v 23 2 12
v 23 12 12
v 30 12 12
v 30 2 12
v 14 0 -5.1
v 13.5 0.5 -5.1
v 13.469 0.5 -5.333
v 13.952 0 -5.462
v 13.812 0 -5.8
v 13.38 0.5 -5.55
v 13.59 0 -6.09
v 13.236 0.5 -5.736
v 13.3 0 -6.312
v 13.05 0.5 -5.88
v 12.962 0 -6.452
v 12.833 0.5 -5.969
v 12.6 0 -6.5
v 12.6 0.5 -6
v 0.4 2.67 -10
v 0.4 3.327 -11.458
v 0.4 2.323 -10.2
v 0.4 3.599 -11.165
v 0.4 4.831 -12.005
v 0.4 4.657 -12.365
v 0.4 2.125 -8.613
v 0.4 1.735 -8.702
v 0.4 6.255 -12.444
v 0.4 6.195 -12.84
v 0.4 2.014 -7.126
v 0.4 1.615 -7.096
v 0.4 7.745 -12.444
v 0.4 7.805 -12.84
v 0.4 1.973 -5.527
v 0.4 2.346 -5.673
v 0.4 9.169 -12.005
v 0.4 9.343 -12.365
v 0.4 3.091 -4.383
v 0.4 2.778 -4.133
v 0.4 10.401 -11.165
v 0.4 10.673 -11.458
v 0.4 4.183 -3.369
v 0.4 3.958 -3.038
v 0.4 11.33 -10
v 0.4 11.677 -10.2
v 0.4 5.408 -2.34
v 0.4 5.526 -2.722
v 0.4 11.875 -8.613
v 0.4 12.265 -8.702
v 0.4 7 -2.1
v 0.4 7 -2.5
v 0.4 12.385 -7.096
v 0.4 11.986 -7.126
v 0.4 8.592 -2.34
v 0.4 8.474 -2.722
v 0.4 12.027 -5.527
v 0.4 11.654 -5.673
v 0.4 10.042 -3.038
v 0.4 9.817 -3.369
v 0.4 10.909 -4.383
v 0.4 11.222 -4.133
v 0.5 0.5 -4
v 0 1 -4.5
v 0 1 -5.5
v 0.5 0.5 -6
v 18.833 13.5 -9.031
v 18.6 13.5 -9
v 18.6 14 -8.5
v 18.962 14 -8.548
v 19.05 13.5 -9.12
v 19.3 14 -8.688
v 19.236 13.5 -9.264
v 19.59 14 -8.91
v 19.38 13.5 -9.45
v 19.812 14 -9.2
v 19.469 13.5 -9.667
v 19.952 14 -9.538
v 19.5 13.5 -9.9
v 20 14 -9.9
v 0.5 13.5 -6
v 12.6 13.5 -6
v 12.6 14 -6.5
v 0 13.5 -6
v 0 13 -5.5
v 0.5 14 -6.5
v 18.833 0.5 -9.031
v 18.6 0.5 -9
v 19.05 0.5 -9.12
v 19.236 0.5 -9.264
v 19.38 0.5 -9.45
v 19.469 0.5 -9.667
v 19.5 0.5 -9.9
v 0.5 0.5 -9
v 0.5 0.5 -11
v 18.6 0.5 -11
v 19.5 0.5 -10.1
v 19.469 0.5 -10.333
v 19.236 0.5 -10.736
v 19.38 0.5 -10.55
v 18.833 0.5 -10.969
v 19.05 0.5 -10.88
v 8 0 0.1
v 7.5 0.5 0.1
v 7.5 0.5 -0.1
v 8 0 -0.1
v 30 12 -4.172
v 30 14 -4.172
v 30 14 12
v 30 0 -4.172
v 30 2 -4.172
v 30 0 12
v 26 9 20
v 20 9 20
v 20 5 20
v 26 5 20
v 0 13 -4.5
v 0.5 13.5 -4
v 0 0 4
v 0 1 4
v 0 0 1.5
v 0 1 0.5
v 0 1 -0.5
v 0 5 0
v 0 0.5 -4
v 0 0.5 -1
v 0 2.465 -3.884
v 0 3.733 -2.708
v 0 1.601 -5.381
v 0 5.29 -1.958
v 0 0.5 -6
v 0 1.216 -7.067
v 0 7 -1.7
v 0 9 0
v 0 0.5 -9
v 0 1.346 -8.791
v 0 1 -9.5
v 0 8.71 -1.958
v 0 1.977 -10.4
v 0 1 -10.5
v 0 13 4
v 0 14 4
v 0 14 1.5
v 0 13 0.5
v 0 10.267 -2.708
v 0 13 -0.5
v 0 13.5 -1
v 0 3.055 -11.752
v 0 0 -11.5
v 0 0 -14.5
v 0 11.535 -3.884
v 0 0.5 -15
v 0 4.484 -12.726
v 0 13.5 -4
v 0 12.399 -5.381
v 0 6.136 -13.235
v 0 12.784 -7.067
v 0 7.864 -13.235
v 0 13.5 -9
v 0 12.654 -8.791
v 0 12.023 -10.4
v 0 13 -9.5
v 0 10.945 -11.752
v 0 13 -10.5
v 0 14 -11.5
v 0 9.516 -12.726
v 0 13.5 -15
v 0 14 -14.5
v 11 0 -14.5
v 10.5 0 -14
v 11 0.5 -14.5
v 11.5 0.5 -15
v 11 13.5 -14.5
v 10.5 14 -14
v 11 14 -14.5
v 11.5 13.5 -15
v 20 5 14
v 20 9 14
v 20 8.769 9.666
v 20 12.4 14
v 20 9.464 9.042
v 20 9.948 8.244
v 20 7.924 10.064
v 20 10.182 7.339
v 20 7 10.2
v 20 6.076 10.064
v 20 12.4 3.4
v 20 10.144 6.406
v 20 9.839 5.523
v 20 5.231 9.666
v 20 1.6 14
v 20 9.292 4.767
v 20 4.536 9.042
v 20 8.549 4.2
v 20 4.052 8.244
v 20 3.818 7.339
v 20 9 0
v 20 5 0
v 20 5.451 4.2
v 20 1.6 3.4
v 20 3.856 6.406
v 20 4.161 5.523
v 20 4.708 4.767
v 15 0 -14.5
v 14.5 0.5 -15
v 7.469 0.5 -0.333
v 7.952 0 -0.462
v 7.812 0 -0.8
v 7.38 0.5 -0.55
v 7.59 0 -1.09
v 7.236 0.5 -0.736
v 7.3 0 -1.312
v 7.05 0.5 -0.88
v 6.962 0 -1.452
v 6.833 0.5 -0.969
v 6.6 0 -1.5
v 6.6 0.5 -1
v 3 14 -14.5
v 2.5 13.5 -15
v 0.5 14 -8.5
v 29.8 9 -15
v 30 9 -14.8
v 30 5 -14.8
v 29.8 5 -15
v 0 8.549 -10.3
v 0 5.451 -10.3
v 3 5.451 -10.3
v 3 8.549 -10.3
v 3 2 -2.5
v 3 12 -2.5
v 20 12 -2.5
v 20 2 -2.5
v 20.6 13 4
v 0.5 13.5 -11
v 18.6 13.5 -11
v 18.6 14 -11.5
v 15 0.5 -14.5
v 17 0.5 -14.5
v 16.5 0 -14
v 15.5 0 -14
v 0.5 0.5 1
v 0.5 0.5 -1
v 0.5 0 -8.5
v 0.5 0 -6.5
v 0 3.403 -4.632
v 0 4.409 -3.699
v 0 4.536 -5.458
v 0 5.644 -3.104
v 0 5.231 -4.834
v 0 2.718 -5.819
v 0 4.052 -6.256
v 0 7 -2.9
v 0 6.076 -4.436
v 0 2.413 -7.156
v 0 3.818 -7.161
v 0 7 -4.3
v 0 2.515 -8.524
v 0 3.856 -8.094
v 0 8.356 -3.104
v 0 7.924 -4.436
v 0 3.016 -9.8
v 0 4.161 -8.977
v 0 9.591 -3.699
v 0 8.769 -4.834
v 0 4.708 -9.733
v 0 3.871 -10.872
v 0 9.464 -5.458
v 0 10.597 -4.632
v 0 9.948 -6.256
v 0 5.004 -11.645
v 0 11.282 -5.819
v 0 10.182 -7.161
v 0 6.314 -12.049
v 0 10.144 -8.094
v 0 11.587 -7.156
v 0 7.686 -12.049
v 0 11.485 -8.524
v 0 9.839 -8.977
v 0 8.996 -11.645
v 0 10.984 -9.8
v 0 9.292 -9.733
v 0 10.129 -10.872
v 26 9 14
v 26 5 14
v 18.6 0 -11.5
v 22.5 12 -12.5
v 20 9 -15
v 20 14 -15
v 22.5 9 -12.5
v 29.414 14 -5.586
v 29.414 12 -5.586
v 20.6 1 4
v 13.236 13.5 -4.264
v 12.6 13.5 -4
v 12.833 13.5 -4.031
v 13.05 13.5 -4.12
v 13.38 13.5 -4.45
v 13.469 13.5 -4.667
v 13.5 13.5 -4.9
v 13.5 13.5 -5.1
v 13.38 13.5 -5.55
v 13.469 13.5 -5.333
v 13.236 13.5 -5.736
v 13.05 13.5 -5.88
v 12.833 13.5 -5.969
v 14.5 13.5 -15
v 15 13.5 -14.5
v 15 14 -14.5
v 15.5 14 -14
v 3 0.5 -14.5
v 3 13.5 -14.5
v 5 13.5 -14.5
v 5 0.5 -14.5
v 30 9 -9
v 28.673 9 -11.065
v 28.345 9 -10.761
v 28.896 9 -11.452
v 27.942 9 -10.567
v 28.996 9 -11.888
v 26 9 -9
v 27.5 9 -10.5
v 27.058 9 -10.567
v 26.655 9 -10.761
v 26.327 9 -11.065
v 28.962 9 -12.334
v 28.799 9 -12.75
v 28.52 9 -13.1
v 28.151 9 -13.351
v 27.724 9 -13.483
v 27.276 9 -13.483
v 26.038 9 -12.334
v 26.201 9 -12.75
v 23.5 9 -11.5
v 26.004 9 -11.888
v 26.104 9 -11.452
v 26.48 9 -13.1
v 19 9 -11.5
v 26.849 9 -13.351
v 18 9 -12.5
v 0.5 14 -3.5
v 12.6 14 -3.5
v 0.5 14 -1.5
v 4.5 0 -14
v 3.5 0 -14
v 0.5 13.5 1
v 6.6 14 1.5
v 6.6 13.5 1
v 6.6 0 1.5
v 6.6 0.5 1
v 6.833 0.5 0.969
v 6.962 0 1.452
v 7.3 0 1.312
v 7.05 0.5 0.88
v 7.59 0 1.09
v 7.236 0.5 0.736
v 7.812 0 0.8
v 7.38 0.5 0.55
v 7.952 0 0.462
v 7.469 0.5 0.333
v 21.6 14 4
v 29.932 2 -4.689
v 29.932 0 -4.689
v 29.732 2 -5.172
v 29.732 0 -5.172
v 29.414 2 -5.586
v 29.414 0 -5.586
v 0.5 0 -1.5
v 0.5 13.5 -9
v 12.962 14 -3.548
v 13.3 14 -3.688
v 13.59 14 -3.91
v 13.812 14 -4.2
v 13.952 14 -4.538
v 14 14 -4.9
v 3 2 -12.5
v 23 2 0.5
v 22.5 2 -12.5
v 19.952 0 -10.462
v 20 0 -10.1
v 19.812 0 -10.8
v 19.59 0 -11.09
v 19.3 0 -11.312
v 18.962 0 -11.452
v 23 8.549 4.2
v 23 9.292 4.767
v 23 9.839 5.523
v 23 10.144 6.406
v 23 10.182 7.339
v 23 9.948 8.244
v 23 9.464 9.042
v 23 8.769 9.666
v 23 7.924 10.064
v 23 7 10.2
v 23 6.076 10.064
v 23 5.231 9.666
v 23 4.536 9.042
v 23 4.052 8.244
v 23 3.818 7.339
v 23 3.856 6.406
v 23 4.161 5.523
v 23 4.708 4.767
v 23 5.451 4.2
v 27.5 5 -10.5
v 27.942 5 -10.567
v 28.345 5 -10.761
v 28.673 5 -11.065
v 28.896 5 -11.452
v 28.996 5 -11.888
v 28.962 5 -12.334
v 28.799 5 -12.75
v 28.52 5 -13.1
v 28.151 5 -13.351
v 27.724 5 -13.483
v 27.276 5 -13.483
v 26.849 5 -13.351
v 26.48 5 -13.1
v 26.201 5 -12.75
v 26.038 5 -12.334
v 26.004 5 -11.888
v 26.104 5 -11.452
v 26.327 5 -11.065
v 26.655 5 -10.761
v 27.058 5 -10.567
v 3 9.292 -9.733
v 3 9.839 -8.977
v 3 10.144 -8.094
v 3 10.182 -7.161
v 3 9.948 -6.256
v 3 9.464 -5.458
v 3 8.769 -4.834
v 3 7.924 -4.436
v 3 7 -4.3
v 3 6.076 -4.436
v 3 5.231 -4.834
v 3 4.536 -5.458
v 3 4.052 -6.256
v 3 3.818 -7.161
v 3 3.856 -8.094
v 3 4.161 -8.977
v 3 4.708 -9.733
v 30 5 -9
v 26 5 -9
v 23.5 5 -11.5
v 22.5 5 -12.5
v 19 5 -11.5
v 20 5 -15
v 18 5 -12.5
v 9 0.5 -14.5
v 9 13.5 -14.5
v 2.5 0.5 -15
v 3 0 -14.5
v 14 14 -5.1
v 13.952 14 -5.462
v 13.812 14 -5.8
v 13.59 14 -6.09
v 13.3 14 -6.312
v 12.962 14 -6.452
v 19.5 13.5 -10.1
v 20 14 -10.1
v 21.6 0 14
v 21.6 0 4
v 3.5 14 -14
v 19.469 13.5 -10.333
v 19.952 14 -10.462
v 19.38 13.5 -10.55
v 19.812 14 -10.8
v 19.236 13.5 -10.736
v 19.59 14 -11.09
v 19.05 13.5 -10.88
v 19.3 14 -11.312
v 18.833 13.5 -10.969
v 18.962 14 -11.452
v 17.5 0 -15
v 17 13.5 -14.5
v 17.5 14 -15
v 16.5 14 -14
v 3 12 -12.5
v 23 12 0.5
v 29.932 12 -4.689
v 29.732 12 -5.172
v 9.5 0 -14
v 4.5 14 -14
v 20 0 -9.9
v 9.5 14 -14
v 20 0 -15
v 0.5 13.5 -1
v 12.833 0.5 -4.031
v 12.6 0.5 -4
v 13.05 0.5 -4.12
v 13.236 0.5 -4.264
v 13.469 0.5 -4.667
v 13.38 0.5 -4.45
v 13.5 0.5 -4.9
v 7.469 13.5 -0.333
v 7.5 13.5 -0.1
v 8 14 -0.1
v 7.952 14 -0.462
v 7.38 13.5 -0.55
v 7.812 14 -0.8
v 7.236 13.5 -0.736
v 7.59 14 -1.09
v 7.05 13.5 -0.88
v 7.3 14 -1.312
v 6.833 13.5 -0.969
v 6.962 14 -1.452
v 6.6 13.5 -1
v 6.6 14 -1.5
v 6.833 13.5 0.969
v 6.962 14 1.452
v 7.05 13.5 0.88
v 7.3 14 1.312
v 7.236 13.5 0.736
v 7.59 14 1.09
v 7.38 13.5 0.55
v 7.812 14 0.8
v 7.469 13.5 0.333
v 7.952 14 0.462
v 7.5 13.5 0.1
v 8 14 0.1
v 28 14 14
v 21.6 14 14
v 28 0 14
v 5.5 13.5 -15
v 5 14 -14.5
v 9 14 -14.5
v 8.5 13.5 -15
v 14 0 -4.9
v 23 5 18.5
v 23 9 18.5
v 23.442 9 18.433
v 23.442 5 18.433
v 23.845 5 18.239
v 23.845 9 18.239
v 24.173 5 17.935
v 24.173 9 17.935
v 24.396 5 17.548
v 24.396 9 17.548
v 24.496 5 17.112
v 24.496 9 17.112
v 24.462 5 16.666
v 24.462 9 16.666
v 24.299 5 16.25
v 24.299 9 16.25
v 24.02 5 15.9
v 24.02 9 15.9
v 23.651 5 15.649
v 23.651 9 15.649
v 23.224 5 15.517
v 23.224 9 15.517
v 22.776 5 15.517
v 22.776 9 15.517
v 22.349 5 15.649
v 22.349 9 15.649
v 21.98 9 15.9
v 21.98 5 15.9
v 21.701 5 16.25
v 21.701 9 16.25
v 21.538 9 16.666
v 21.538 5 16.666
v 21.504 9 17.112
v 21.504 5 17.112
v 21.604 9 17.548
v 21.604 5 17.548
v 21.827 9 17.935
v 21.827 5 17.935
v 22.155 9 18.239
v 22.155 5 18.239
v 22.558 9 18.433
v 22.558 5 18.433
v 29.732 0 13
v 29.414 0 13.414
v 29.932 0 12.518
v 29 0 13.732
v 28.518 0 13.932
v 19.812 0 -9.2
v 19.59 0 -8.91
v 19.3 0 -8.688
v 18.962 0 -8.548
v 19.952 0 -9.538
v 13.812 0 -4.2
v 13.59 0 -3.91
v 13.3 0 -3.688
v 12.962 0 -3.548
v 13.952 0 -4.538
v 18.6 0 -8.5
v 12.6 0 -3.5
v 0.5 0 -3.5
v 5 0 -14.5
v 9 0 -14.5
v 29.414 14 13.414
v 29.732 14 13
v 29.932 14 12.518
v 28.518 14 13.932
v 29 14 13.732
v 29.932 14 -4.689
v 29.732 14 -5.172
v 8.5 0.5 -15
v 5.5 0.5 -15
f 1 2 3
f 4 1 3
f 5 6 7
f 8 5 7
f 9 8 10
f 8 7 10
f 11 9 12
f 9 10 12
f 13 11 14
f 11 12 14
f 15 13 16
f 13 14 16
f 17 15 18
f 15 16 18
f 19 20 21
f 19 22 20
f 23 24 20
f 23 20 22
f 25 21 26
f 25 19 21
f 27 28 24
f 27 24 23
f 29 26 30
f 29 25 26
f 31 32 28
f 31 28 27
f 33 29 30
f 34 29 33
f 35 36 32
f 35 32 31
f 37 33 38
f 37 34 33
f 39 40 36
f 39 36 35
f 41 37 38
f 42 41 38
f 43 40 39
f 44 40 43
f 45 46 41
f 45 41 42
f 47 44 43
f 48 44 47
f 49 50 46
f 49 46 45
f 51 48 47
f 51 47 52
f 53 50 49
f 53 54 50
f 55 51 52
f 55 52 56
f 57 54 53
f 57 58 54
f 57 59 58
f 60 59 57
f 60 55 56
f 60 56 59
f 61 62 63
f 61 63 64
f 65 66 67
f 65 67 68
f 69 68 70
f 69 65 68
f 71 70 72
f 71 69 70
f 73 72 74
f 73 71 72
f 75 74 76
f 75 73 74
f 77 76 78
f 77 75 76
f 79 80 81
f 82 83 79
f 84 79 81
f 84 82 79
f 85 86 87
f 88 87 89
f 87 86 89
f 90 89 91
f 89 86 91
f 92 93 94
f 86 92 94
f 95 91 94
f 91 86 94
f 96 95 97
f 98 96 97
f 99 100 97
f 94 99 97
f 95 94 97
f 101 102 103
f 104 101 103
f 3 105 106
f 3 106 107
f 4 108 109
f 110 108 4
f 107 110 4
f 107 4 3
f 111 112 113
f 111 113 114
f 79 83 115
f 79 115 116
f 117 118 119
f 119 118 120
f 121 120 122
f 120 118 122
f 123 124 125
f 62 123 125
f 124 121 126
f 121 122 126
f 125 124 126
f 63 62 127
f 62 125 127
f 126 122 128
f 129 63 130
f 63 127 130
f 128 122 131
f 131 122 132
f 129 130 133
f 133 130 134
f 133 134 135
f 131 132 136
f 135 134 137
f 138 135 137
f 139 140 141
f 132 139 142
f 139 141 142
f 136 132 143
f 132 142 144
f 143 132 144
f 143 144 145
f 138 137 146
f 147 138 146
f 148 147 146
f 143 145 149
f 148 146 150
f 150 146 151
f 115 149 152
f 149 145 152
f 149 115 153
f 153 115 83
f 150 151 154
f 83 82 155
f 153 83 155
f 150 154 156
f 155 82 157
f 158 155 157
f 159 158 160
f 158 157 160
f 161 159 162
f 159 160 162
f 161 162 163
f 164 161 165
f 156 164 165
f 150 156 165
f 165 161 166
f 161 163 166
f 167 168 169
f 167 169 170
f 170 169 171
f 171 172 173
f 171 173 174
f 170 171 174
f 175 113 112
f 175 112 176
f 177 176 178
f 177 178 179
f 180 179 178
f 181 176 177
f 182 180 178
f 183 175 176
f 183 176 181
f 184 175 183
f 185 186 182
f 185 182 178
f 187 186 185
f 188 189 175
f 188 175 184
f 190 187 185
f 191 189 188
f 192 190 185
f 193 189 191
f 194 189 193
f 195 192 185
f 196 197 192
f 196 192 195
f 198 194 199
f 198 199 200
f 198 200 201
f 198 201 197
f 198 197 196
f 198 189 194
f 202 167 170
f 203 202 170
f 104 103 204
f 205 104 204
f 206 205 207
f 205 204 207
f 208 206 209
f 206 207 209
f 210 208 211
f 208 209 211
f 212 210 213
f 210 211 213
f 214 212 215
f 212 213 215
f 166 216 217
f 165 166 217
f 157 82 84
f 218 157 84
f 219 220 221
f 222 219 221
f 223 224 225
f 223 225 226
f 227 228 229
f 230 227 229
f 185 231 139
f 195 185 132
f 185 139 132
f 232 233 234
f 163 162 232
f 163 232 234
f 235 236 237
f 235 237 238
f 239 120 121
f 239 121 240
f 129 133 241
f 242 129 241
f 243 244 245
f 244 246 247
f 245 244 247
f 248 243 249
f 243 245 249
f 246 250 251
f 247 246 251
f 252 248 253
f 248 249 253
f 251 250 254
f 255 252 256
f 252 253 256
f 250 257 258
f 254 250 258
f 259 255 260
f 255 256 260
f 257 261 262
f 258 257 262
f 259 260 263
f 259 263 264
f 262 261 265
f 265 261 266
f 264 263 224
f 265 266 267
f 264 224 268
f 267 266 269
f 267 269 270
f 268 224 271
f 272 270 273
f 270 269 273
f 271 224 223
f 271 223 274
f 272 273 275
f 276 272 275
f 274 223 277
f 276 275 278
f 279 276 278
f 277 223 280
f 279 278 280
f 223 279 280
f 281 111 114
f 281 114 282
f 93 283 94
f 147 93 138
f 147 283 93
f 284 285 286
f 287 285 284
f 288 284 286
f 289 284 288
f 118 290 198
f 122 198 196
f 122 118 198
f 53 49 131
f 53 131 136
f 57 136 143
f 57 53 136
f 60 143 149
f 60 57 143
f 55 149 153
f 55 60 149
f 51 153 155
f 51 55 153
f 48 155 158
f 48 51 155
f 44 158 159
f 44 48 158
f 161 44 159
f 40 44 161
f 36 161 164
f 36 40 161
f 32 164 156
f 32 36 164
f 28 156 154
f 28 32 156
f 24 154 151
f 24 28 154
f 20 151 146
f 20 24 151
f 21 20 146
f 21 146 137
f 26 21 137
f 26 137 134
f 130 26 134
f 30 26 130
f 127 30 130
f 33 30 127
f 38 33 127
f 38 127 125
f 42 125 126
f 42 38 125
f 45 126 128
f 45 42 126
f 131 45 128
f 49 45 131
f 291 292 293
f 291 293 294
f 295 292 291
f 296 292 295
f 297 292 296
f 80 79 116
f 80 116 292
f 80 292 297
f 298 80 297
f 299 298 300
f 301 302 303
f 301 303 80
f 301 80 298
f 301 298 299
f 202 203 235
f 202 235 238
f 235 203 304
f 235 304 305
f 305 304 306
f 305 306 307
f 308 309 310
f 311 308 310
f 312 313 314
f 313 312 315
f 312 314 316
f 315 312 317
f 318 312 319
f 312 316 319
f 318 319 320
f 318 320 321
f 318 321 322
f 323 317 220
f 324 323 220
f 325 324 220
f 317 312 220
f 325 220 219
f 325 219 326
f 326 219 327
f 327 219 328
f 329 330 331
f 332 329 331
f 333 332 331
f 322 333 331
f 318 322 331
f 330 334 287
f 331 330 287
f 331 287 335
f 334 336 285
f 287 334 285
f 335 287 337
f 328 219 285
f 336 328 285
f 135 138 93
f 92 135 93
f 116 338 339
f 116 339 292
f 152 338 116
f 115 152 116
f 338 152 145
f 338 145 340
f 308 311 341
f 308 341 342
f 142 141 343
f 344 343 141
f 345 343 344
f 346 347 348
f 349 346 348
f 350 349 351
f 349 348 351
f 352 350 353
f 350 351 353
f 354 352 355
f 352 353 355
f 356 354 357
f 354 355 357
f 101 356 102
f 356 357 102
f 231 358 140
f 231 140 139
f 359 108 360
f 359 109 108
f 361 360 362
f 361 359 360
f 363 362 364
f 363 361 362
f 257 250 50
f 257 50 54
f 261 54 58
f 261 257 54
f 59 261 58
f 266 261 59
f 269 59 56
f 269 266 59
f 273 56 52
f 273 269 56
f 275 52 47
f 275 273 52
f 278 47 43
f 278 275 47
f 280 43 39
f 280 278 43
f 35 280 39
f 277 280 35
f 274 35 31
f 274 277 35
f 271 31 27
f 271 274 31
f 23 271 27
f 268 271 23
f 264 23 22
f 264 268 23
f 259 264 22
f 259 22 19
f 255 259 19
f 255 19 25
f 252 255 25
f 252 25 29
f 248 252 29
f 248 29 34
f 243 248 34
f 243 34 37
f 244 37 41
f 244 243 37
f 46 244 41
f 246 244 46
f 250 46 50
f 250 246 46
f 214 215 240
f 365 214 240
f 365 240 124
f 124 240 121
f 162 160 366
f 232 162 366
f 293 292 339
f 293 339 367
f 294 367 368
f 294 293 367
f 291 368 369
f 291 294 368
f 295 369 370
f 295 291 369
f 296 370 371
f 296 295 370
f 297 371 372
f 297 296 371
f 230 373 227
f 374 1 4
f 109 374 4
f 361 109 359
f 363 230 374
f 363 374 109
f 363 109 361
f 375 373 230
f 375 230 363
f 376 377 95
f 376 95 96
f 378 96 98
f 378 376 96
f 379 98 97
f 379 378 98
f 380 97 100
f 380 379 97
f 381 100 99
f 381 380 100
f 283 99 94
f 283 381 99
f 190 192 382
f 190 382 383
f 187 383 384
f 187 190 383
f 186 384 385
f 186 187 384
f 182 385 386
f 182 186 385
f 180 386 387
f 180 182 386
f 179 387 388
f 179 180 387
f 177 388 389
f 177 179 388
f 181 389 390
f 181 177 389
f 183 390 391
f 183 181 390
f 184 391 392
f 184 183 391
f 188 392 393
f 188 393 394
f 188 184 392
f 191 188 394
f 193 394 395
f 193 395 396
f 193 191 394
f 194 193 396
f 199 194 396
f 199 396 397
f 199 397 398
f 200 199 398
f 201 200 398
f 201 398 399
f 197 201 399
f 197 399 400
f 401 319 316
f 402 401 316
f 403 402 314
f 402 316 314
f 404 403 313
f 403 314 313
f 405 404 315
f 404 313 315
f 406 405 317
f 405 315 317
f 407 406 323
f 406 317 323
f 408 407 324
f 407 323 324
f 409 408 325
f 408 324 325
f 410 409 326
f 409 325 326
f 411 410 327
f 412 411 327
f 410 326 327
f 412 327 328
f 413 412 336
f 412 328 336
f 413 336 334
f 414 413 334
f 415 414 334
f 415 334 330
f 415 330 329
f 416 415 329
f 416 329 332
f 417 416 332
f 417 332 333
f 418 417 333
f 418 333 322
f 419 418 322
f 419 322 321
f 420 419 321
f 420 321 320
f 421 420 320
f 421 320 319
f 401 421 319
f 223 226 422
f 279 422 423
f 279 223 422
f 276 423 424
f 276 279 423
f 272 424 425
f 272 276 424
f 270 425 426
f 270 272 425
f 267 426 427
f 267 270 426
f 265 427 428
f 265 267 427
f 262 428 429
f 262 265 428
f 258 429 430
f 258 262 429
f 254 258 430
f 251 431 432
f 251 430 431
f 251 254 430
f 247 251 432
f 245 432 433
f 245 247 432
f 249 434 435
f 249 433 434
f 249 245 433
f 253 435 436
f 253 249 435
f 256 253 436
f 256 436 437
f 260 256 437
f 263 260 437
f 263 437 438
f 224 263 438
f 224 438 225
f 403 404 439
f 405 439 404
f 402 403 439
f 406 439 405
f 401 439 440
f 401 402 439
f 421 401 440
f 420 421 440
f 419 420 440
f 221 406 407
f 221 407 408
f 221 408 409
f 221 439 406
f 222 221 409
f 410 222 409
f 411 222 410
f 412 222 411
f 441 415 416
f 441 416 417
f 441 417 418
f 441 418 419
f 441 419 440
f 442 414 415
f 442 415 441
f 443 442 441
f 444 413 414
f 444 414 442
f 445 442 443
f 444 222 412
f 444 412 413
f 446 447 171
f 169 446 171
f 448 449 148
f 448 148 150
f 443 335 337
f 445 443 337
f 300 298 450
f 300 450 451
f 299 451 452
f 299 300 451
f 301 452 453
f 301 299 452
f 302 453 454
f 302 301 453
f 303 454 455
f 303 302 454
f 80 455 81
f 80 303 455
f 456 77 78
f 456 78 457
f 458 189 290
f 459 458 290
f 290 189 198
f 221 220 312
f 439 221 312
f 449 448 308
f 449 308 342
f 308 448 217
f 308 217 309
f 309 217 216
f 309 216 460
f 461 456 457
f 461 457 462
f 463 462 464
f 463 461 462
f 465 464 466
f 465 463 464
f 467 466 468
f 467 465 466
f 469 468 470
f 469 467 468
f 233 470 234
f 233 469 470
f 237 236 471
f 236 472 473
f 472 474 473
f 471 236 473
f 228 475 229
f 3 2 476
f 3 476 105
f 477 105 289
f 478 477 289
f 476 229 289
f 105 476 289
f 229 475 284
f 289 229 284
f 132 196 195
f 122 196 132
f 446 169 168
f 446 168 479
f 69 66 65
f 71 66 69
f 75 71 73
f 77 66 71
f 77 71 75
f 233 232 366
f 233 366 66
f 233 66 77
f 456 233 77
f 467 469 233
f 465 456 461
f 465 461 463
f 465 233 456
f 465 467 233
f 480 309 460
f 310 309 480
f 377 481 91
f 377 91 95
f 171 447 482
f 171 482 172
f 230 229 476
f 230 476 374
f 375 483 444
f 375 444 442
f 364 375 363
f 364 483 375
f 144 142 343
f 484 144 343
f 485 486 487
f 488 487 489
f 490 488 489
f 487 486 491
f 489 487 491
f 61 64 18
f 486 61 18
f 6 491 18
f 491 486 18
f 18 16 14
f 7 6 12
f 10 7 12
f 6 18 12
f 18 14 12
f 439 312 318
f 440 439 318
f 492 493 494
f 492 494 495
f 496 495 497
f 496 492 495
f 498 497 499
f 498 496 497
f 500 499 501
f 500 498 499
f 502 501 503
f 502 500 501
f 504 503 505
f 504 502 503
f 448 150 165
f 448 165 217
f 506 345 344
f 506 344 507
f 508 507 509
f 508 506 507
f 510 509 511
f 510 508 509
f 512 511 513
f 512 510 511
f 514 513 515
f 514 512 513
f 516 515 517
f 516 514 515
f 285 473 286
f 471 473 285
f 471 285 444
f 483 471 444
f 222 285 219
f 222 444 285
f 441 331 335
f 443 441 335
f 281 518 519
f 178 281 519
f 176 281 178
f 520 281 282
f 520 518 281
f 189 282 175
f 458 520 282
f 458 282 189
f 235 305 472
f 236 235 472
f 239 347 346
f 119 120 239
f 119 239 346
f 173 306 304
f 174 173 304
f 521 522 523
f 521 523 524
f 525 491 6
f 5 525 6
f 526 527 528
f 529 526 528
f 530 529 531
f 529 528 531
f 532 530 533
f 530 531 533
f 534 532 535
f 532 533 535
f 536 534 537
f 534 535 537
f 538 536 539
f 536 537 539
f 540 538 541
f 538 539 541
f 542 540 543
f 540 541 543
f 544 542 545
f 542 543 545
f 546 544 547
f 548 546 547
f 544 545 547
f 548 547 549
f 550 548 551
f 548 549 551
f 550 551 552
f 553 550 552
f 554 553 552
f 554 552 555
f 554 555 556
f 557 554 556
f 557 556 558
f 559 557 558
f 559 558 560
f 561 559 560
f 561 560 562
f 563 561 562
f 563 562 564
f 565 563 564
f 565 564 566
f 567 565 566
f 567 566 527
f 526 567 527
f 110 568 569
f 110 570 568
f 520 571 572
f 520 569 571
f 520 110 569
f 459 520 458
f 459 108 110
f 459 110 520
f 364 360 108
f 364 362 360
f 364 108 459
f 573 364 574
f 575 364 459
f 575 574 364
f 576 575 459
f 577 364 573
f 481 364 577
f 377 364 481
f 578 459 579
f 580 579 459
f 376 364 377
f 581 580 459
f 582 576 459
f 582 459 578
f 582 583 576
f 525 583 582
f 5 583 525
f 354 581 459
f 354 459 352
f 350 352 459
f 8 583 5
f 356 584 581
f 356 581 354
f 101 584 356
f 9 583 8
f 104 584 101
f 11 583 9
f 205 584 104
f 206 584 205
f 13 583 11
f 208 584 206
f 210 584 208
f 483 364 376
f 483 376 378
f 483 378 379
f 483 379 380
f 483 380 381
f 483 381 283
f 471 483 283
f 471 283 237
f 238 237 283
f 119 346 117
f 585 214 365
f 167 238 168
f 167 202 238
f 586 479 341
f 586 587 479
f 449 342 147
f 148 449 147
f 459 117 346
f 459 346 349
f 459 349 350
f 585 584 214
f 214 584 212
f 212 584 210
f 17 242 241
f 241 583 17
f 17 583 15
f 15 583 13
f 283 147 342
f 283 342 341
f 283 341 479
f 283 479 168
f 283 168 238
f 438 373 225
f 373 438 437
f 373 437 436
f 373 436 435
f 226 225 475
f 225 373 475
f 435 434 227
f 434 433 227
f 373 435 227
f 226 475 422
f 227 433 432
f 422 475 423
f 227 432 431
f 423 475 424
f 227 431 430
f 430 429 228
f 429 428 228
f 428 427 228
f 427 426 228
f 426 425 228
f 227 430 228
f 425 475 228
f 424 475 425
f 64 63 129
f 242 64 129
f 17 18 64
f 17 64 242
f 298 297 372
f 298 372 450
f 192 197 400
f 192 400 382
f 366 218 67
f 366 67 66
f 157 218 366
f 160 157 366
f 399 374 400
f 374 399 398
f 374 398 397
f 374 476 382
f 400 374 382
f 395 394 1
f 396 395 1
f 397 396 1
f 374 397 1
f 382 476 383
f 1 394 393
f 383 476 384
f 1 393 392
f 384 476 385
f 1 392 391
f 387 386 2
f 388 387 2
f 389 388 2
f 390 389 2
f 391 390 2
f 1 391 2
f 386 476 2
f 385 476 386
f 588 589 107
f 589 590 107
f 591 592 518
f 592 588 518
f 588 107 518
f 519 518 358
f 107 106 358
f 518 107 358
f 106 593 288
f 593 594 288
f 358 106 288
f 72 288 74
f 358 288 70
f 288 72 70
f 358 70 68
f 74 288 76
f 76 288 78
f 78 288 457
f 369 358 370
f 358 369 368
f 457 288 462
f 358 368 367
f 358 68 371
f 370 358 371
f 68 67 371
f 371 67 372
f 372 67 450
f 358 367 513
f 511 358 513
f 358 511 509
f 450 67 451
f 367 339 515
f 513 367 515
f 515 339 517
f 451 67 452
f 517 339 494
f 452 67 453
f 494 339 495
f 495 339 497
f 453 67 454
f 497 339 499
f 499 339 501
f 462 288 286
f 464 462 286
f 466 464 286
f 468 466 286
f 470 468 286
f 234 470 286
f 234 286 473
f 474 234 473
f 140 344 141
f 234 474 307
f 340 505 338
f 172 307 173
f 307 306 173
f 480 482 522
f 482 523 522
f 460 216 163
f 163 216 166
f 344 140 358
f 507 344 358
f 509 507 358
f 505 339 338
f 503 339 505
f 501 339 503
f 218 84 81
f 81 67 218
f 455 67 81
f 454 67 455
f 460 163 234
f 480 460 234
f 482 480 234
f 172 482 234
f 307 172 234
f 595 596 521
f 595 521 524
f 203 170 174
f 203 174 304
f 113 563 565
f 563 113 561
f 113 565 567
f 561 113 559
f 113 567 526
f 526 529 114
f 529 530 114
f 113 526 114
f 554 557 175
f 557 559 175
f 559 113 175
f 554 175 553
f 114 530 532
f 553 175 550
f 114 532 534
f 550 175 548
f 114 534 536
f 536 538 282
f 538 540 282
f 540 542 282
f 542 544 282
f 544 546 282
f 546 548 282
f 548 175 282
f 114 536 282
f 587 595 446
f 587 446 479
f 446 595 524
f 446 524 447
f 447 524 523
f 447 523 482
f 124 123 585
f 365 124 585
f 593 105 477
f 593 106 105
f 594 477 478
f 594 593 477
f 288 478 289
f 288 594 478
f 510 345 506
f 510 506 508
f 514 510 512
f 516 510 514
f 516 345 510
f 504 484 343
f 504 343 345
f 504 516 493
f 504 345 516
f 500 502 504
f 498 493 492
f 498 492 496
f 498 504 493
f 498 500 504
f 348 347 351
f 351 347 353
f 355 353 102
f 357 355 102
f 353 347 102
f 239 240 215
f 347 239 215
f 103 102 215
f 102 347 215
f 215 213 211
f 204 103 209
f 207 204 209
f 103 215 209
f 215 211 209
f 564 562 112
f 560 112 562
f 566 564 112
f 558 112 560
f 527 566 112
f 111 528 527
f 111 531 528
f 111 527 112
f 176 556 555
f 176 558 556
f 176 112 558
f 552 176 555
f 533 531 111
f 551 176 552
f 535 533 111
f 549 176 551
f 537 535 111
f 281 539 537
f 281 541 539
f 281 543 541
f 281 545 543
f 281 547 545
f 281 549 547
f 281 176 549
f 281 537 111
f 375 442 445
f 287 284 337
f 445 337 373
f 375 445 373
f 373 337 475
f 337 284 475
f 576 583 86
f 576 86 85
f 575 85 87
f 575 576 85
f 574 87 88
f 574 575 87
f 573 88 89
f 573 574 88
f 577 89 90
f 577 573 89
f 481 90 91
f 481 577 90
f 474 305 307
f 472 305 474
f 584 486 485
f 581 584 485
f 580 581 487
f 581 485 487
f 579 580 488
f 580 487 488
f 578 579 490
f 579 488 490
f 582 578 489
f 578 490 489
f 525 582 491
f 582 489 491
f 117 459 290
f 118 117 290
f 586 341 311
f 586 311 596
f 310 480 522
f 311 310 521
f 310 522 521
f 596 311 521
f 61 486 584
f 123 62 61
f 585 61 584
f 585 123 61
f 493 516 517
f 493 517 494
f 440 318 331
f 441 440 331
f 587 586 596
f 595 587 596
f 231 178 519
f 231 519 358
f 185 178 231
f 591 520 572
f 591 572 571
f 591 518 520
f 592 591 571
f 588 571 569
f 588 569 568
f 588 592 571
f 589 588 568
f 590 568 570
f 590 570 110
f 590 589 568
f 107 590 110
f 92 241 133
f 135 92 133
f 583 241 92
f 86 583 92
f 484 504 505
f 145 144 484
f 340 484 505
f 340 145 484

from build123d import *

# Parameters (mm, degrees)
EXTRUDE_1_DEPTH     = 14
CUT_EXTRUDE_1_DEPTH = 3
CHAMFER_1_SIZE      = 1.6
EXTRUDE_START       = -5
SKETCH_3_W          = 6
SKETCH_3_H          = 6
EXTRUDE_3_DEPTH     = 4
CUT_EXTRUDE_2_DEPTH = 3.4
CUT_EXTRUDE_START   = -2
CUT_EXTRUDE_3_DEPTH = 10
EXTRUDE_4_DEPTH     = 4
CHAMFER_2_SIZE      = 3
SKETCH_7_R          = 1.5
CUT_EXTRUDE_4_DEPTH = 39.678159212
CHAMFER_3_SIZE      = 0.2
CUT_EXTRUDE_5_DEPTH = 39.678159212
CHAMFER_5_SIZE      = 0.5
EXTRUDE_5_DEPTH     = 22
CUT_EXTRUDE_6_DEPTH = 0.5
CUT_EXTRUDE_START_2 = -13.5
CUT_EXTRUDE_7_DEPTH = 0.5
SKETCH_13_R         = 5.4
SKETCH_13_R_2       = 5
CUT_EXTRUDE_8_DEPTH = 0.4
CHAMFER_7_SIZE      = 0.4
CHAMFER_8_SIZE      = 0.5
CHAMFER_6_SIZE      = 0.5
CHAMFER_9_SIZE      = 0.4
FILLET_1_R          = 2


# Some blends are built 0.0001 mm under size
with BuildPart() as part:
    # 草图1 → 凸台-拉伸1 (new body)
    with BuildSketch(Plane(origin=(0, 0, 0), x_dir=(1, 0, 0), z_dir=(0, 1, 0))):
        Polygon((20, 15), (30, 5), (30, -14), (20, -14), (20, 0), (0, 0), (0, 15), align=None)
    extrude(amount=EXTRUDE_1_DEPTH)

    # 草图2 → 切除-拉伸1 (cut)
    with BuildSketch(Plane.ZY.offset(-20)):
        with BuildLine():
            Line((4.2, 5.450806662), (4.2, 8.549193338))
            ThreePointArc((4.2, 8.549193338), (10.2, 7), (4.2, 5.450806662))
        make_face()
    extrude(amount=-CUT_EXTRUDE_1_DEPTH, mode=Mode.SUBTRACT)

    # 倒角1
    chamfer_1_edges = [part.edges().sort_by_distance(p)[0] for p in [
        (20, 14, 7),
        (20, 0, 7),
    ]]
    chamfer(chamfer_1_edges, length=CHAMFER_1_SIZE)

    # 草图3 → 凸台-拉伸3 (add)
    with BuildSketch(Plane(origin=(0, 14, 0), x_dir=(1, 0, 0), z_dir=(0, 1, 0)).offset(EXTRUDE_START)):
        with Locations((23, -17)):
            Rectangle(SKETCH_3_W, SKETCH_3_H)
    extrude(amount=-EXTRUDE_3_DEPTH)

    # 草图4 → 切除-拉伸2 (cut)
    with BuildSketch(Plane.ZY):
        with BuildLine():
            Line((-10.3, 5.450806662), (-10.3, 8.549193338))
            ThreePointArc((-10.3, 8.549193338), (-4.3, 7), (-10.3, 5.450806662))
        make_face()
    extrude(amount=-CUT_EXTRUDE_2_DEPTH, mode=Mode.SUBTRACT)

    # 草图5 → 切除-拉伸3 (cut)
    with BuildSketch(Plane(origin=(0, 14, 0), x_dir=(1, 0, 0), z_dir=(0, 1, 0)).offset(CUT_EXTRUDE_START)):
        Polygon((3, 2.5), (23, 2.5), (23, -12), (30, -12), (30, 12.5), (3, 12.5), align=None)
    extrude(amount=-CUT_EXTRUDE_3_DEPTH, mode=Mode.SUBTRACT)

    # 草图6 → 凸台-拉伸4 (add)
    with BuildSketch(Plane(origin=(0, 14, 0), x_dir=(1, 0, 0), z_dir=(0, 1, 0)).offset(EXTRUDE_START)):
        Polygon((23.5, 11.5), (19, 11.5), (18, 12.5), (22.5, 12.5), (20, 15), (30, 15), (30, 9), (26, 9), align=None)
    extrude(amount=-EXTRUDE_4_DEPTH)

    # 倒角2
    chamfer_2_edges = [part.edges().sort_by_distance(p)[0] for p in [
        (23, 7, -2.5),
    ]]
    chamfer(chamfer_2_edges, length=CHAMFER_2_SIZE)

    # 草图7 → 切除-拉伸4 (cut, through all)
    with BuildSketch(Plane(origin=(0, 14, 0), x_dir=(1, 0, 0), z_dir=(0, 1, 0))):
        with Locations(Location((27.5, 12, 0), (0, 0, 270))):
            Circle(SKETCH_7_R)
        with Locations(Location((23, -17, 0), (0, 0, 270))):
            Circle(SKETCH_7_R)
    extrude(amount=-CUT_EXTRUDE_4_DEPTH, mode=Mode.SUBTRACT)

    # 倒角3
    chamfer_3_edges = [part.edges().sort_by_distance(p)[0] for p in [
        (30, 7, -15),
    ]]
    chamfer(chamfer_3_edges, length=CHAMFER_3_SIZE)

    # 草图8 → 切除-拉伸5 (cut, through all)
    with BuildSketch(Plane(origin=(0, 14, 0), x_dir=(1, 0, 0), z_dir=(0, 1, 0))):
        Polygon((5.5, 15), (2.5, 15), (3, 14.5), (5, 14.5), align=None)
        Polygon((11.5, 15), (8.5, 15), (9, 14.5), (11, 14.5), align=None)
        Polygon((17.5, 15), (14.5, 15), (15, 14.5), (17, 14.5), align=None)
    extrude(amount=-CUT_EXTRUDE_5_DEPTH, mode=Mode.SUBTRACT)

    # 倒角5
    chamfer_5_edges = [part.edges().sort_by_distance(p)[0] for p in [
        (4, 0, -14.5),
        (4, 14, -14.5),
        (10, 0, -14.5),
        (10, 14, -14.5),
        (16, 0, -14.5),
        (16, 14, -14.5),
    ]]
    chamfer(chamfer_5_edges, length=CHAMFER_5_SIZE)

    # 草图15 → 凸台-拉伸5 (add)
    with BuildSketch(Plane.ZY):
        Polygon((0, 14), (4, 14), (4, 13), (0, 9), align=None)
        Polygon((0, 0), (4, 0), (4, 1), (0, 5), align=None)
    extrude(amount=-EXTRUDE_5_DEPTH)

    # 草图9 → 切除-拉伸6 (cut)
    with BuildSketch(Plane(origin=(0, 14, 0), x_dir=(1, 0, 0), z_dir=(0, 1, 0))):
        with BuildLine():
            Line((0, 3.5), (12.6, 3.5))
            ThreePointArc((12.6, 3.5), (13.589949494, 3.910050506), (14, 4.9))
            Line((14, 4.9), (14, 5.1))
            ThreePointArc((14, 5.1), (13.589949494, 6.089949494), (12.6, 6.5))
            Line((12.6, 6.5), (0, 6.5))
            Line((0, 6.5), (0, 3.5))
        make_face()
        with BuildLine():
            Line((0, 8.5), (18.6, 8.5))
            ThreePointArc((18.6, 8.5), (19.589949494, 8.910050506), (20, 9.9))
            Line((20, 9.9), (20, 10.1))
            ThreePointArc((20, 10.1), (19.589949494, 11.089949494), (18.6, 11.5))
            Line((18.6, 11.5), (0, 11.5))
            Line((0, 11.5), (0, 8.5))
        make_face()
        with BuildLine():
            Line((0, -1.5), (6.6, -1.5))
            ThreePointArc((6.6, -1.5), (7.589949494, -1.089949494), (8, -0.1))
            Line((8, -0.1), (8, 0.1))
            ThreePointArc((8, 0.1), (7.589949494, 1.089949494), (6.6, 1.5))
            Line((6.6, 1.5), (0, 1.5))
            Line((0, 1.5), (0, -1.5))
        make_face()
    extrude(amount=-CUT_EXTRUDE_6_DEPTH, mode=Mode.SUBTRACT)

    # 草图9<2> → 切除-拉伸7 (cut)
    with BuildSketch(Plane(origin=(0, 14, 0), x_dir=(1, 0, 0), z_dir=(0, 1, 0)).offset(CUT_EXTRUDE_START_2)):
        with BuildLine():
            Line((0, 3.5), (12.6, 3.5))
            ThreePointArc((12.6, 3.5), (13.589949494, 3.910050506), (14, 4.9))
            Line((14, 4.9), (14, 5.1))
            ThreePointArc((14, 5.1), (13.589949494, 6.089949494), (12.6, 6.5))
            Line((12.6, 6.5), (0, 6.5))
            Line((0, 6.5), (0, 3.5))
        make_face()
        with BuildLine():
            Line((0, 8.5), (18.6, 8.5))
            ThreePointArc((18.6, 8.5), (19.589949494, 8.910050506), (20, 9.9))
            Line((20, 9.9), (20, 10.1))
            ThreePointArc((20, 10.1), (19.589949494, 11.089949494), (18.6, 11.5))
            Line((18.6, 11.5), (0, 11.5))
            Line((0, 11.5), (0, 8.5))
        make_face()
        with BuildLine():
            Line((0, -1.5), (6.6, -1.5))
            ThreePointArc((6.6, -1.5), (7.589949494, -1.089949494), (8, -0.1))
            Line((8, -0.1), (8, 0.1))
            ThreePointArc((8, 0.1), (7.589949494, 1.089949494), (6.6, 1.5))
            Line((6.6, 1.5), (0, 1.5))
            Line((0, 1.5), (0, -1.5))
        make_face()
    extrude(amount=-CUT_EXTRUDE_7_DEPTH, mode=Mode.SUBTRACT)

    # 草图13 → 切除-拉伸8 (cut)
    with BuildSketch(Plane.ZY):
        with Locations((-7.5, 7)):
            Circle(SKETCH_13_R)
        with Locations((-7.5, 7)):
            Circle(SKETCH_13_R_2, mode=Mode.SUBTRACT)
    extrude(amount=-CUT_EXTRUDE_8_DEPTH, mode=Mode.SUBTRACT)

    # 倒角7
    chamfer_7_edges = [part.edges().sort_by_distance(p)[0] for p in [
        (0, 7, -12.5),
    ]]
    chamfer(chamfer_7_edges, length=CHAMFER_7_SIZE - 0.0001)  # a hair under: the kernel refuses the full size

    # 倒角8
    chamfer_8_edges = [part.edges().sort_by_distance(p)[0] for p in [
        (6.3, 13.5, -3.5),
        (13.589949494, 13.5, -3.910050506),
        (14, 13.5, -5),
        (13.589949494, 13.5, -6.089949494),
        (6.3, 13.5, -6.5),
        (9.3, 13.5, -8.5),
        (19.589949494, 13.5, -8.910050506),
        (20, 13.5, -10),
        (19.589949494, 13.5, -11.089949494),
        (9.3, 13.5, -11.5),
        (6.3, 0.5, -3.5),
        (13.589949494, 0.5, -3.910050506),
        (14, 0.5, -5),
        (13.589949494, 0.5, -6.089949494),
        (6.3, 0.5, -6.5),
        (9.3, 0.5, -8.5),
        (19.589949494, 0.5, -8.910050506),
        (20, 0.5, -10),
        (19.589949494, 0.5, -11.089949494),
        (9.3, 0.5, -11.5),
        (3.3, 0.5, 1.5),
        (7.589949494, 0.5, 1.089949494),
        (8, 0.5, 0),
        (7.589949494, 0.5, -1.089949494),
        (3.3, 0.5, -1.5),
        (3.3, 13.5, 1.5),
        (7.589949494, 13.5, 1.089949494),
        (8, 13.5, 0),
        (7.589949494, 13.5, -1.089949494),
        (3.3, 13.5, -1.5),
    ]]
    chamfer(chamfer_8_edges, length=CHAMFER_8_SIZE - 0.0001)  # a hair under: the kernel refuses the full size

    # 倒角6
    # the kernel refuses this chamfer: 0.5 mm, written as the material it takes off along each edge
    with BuildSketch(Plane(origin=(0, 0.5, -2.285941494), x_dir=(0, 1, 0), z_dir=(0, 0, 1))) as chamfer_6_piece_1_section:
        Polygon((CHAMFER_6_SIZE, 0), (0, -CHAMFER_6_SIZE), (0, 0), align=None)
    chamfer_6_piece_1 = extrude(amount=4.571882988, mode=Mode.PRIVATE)
    chamfer_6_piece_1 = split(chamfer_6_piece_1, bisect_by=Plane(origin=(0, 2.143020747, -0.642920747), z_dir=(0, -0.7071067811865476, -0.7071067811865476)), keep=Keep.TOP, mode=Mode.PRIVATE)
    chamfer_6_piece_1 = split(chamfer_6_piece_1, bisect_by=Plane(origin=(0, -0.142920747, -1.643020747), z_dir=(0, -0.7071067811865476, 0.7071067811865476)), keep=Keep.TOP, mode=Mode.PRIVATE)
    add(chamfer_6_piece_1, mode=Mode.SUBTRACT)
    with BuildSketch(Plane(origin=(0, 0, -4.785841494), x_dir=(0, 1, 0), z_dir=(0, 0, 1)), Plane(origin=(0, 0, -9.785841494), x_dir=(0, 1, 0), z_dir=(0, 0, 1))) as chamfer_6_piece_2:
        Polygon((CHAMFER_6_SIZE, 0), (0, -CHAMFER_6_SIZE), (0, 0), align=None)
    extrude(amount=4.571682988, mode=Mode.SUBTRACT)
    with BuildSketch(Plane(origin=(0, 0.5, -7.285941494), x_dir=(0, 1, 0), z_dir=(0, 0, 1))) as chamfer_6_piece_3_section:
        Polygon((CHAMFER_6_SIZE, 0), (0, -CHAMFER_6_SIZE), (0, 0), align=None)
    chamfer_6_piece_3 = extrude(amount=4.571882988, mode=Mode.PRIVATE)
    chamfer_6_piece_3 = split(chamfer_6_piece_3, bisect_by=Plane(origin=(0, 2.143020747, -5.642920747), z_dir=(0, -0.7071067811865474, -0.7071067811865477)), keep=Keep.TOP, mode=Mode.PRIVATE)
    chamfer_6_piece_3 = split(chamfer_6_piece_3, bisect_by=Plane(origin=(0, -0.142920747, -6.643020747), z_dir=(0, -0.7071067811865477, 0.7071067811865474)), keep=Keep.TOP, mode=Mode.PRIVATE)
    add(chamfer_6_piece_3, mode=Mode.SUBTRACT)
    with BuildSketch(Plane(origin=(0, 13.5, -2.285941494), x_dir=(0, -1, 0), z_dir=(0, 0, 1))) as chamfer_6_piece_4_section:
        Polygon((CHAMFER_6_SIZE, 0), (0, CHAMFER_6_SIZE), (0, 0), align=None)
    chamfer_6_piece_4 = extrude(amount=4.571882988, mode=Mode.PRIVATE)
    chamfer_6_piece_4 = split(chamfer_6_piece_4, bisect_by=Plane(origin=(0, 11.856979253, -0.642920747), z_dir=(0, 0.7071067811865474, -0.7071067811865477)), keep=Keep.TOP, mode=Mode.PRIVATE)
    chamfer_6_piece_4 = split(chamfer_6_piece_4, bisect_by=Plane(origin=(0, 14.142920747, -1.643020747), z_dir=(0, 0.7071067811865474, 0.7071067811865477)), keep=Keep.TOP, mode=Mode.PRIVATE)
    add(chamfer_6_piece_4, mode=Mode.SUBTRACT)
    with BuildSketch(Plane(origin=(0, 14, -4.785841494), x_dir=(0, -1, 0), z_dir=(0, 0, 1)), Plane(origin=(0, 14, -9.785841494), x_dir=(0, -1, 0), z_dir=(0, 0, 1))) as chamfer_6_piece_5:
        Polygon((CHAMFER_6_SIZE, 0), (0, CHAMFER_6_SIZE), (0, 0), align=None)
    extrude(amount=4.571682988, mode=Mode.SUBTRACT)
    with BuildSketch(Plane(origin=(0, 0.5, -12.285941494), x_dir=(0, 1, 0), z_dir=(0, 0, 1))) as chamfer_6_piece_6_section:
        Polygon((CHAMFER_6_SIZE, 0), (0, -CHAMFER_6_SIZE), (0, 0), align=None)
    chamfer_6_piece_6 = extrude(amount=4.571882988, mode=Mode.PRIVATE)
    chamfer_6_piece_6 = split(chamfer_6_piece_6, bisect_by=Plane(origin=(0, 2.143020747, -10.642920747), z_dir=(0, -0.7071067811865477, -0.7071067811865474)), keep=Keep.TOP, mode=Mode.PRIVATE)
    chamfer_6_piece_6 = split(chamfer_6_piece_6, bisect_by=Plane(origin=(0, -0.142920747, -11.643020747), z_dir=(0, -0.7071067811865477, 0.7071067811865474)), keep=Keep.TOP, mode=Mode.PRIVATE)
    add(chamfer_6_piece_6, mode=Mode.SUBTRACT)
    with BuildSketch(Plane(origin=(0, 13.5, -7.285941494), x_dir=(0, -1, 0), z_dir=(0, 0, 1))) as chamfer_6_piece_7_section:
        Polygon((CHAMFER_6_SIZE, 0), (0, CHAMFER_6_SIZE), (0, 0), align=None)
    chamfer_6_piece_7 = extrude(amount=4.571882988, mode=Mode.PRIVATE)
    chamfer_6_piece_7 = split(chamfer_6_piece_7, bisect_by=Plane(origin=(0, 11.856979253, -5.642920747), z_dir=(0, 0.7071067811865472, -0.7071067811865479)), keep=Keep.TOP, mode=Mode.PRIVATE)
    chamfer_6_piece_7 = split(chamfer_6_piece_7, bisect_by=Plane(origin=(0, 14.142920747, -6.643020747), z_dir=(0, 0.7071067811865476, 0.7071067811865476)), keep=Keep.TOP, mode=Mode.PRIVATE)
    add(chamfer_6_piece_7, mode=Mode.SUBTRACT)
    with BuildSketch(Plane(origin=(0, 13.5, -12.285941494), x_dir=(0, -1, 0), z_dir=(0, 0, 1))) as chamfer_6_piece_8_section:
        Polygon((CHAMFER_6_SIZE, 0), (0, CHAMFER_6_SIZE), (0, 0), align=None)
    chamfer_6_piece_8 = extrude(amount=4.571882988, mode=Mode.PRIVATE)
    chamfer_6_piece_8 = split(chamfer_6_piece_8, bisect_by=Plane(origin=(0, 14.142920747, -11.643020747), z_dir=(0, 0.7071067811865476, 0.7071067811865476)), keep=Keep.TOP, mode=Mode.PRIVATE)
    chamfer_6_piece_8 = split(chamfer_6_piece_8, bisect_by=Plane(origin=(0, 11.856979253, -10.642920747), z_dir=(0, 0.7071067811865476, -0.7071067811865476)), keep=Keep.TOP, mode=Mode.PRIVATE)
    add(chamfer_6_piece_8, mode=Mode.SUBTRACT)
    with BuildSketch(Plane(origin=(-1.285841494, 0, -15), x_dir=(0, 0, 1), z_dir=(1, 0, 0))) as chamfer_6_piece_9:
        Polygon((CHAMFER_6_SIZE, 0), (0, -CHAMFER_6_SIZE), (0, 0), align=None)
    extrude(amount=5.071682988, mode=Mode.SUBTRACT)
    with BuildSketch(Plane(origin=(10.214158506, 0, -15), x_dir=(0, 0, 1), z_dir=(1, 0, 0)), Plane(origin=(4.214158506, 0, -15), x_dir=(0, 0, 1), z_dir=(1, 0, 0))) as chamfer_6_piece_10:
        Polygon((CHAMFER_6_SIZE, 0), (0, -CHAMFER_6_SIZE), (0, 0), align=None)
    extrude(amount=5.571682988, mode=Mode.SUBTRACT)
    with BuildSketch(Plane(origin=(-1.285841494, 14, -15), x_dir=(0, 0, 1), z_dir=(1, 0, 0))) as chamfer_6_piece_11:
        Polygon((CHAMFER_6_SIZE, 0), (0, CHAMFER_6_SIZE), (0, 0), align=None)
    extrude(amount=5.071682988, mode=Mode.SUBTRACT)
    with BuildSketch(Plane(origin=(10.214158506, 14, -15), x_dir=(0, 0, 1), z_dir=(1, 0, 0)), Plane(origin=(4.214158506, 14, -15), x_dir=(0, 0, 1), z_dir=(1, 0, 0))) as chamfer_6_piece_12:
        Polygon((CHAMFER_6_SIZE, 0), (0, CHAMFER_6_SIZE), (0, 0), align=None)
    extrude(amount=5.571682988, mode=Mode.SUBTRACT)

    # 倒角9
    chamfer_9_edges = [part.edges().sort_by_distance(p)[0] for p in [
        (0, 7, -12.9),
    ]]
    chamfer(chamfer_9_edges, length=CHAMFER_9_SIZE - 0.0001)  # a hair under: the kernel refuses the full size

    # 圆角1
    fillet_1_edges = [part.edges().sort_by_distance(p)[0] for p in [
        (30, 13, -5),
        (30, 7, 14),
        (30, 1, -5),
    ]]
    fillet(fillet_1_edges, radius=FILLET_1_R - 0.0001)  # a hair under: the kernel refuses the full size


solid = part.part
